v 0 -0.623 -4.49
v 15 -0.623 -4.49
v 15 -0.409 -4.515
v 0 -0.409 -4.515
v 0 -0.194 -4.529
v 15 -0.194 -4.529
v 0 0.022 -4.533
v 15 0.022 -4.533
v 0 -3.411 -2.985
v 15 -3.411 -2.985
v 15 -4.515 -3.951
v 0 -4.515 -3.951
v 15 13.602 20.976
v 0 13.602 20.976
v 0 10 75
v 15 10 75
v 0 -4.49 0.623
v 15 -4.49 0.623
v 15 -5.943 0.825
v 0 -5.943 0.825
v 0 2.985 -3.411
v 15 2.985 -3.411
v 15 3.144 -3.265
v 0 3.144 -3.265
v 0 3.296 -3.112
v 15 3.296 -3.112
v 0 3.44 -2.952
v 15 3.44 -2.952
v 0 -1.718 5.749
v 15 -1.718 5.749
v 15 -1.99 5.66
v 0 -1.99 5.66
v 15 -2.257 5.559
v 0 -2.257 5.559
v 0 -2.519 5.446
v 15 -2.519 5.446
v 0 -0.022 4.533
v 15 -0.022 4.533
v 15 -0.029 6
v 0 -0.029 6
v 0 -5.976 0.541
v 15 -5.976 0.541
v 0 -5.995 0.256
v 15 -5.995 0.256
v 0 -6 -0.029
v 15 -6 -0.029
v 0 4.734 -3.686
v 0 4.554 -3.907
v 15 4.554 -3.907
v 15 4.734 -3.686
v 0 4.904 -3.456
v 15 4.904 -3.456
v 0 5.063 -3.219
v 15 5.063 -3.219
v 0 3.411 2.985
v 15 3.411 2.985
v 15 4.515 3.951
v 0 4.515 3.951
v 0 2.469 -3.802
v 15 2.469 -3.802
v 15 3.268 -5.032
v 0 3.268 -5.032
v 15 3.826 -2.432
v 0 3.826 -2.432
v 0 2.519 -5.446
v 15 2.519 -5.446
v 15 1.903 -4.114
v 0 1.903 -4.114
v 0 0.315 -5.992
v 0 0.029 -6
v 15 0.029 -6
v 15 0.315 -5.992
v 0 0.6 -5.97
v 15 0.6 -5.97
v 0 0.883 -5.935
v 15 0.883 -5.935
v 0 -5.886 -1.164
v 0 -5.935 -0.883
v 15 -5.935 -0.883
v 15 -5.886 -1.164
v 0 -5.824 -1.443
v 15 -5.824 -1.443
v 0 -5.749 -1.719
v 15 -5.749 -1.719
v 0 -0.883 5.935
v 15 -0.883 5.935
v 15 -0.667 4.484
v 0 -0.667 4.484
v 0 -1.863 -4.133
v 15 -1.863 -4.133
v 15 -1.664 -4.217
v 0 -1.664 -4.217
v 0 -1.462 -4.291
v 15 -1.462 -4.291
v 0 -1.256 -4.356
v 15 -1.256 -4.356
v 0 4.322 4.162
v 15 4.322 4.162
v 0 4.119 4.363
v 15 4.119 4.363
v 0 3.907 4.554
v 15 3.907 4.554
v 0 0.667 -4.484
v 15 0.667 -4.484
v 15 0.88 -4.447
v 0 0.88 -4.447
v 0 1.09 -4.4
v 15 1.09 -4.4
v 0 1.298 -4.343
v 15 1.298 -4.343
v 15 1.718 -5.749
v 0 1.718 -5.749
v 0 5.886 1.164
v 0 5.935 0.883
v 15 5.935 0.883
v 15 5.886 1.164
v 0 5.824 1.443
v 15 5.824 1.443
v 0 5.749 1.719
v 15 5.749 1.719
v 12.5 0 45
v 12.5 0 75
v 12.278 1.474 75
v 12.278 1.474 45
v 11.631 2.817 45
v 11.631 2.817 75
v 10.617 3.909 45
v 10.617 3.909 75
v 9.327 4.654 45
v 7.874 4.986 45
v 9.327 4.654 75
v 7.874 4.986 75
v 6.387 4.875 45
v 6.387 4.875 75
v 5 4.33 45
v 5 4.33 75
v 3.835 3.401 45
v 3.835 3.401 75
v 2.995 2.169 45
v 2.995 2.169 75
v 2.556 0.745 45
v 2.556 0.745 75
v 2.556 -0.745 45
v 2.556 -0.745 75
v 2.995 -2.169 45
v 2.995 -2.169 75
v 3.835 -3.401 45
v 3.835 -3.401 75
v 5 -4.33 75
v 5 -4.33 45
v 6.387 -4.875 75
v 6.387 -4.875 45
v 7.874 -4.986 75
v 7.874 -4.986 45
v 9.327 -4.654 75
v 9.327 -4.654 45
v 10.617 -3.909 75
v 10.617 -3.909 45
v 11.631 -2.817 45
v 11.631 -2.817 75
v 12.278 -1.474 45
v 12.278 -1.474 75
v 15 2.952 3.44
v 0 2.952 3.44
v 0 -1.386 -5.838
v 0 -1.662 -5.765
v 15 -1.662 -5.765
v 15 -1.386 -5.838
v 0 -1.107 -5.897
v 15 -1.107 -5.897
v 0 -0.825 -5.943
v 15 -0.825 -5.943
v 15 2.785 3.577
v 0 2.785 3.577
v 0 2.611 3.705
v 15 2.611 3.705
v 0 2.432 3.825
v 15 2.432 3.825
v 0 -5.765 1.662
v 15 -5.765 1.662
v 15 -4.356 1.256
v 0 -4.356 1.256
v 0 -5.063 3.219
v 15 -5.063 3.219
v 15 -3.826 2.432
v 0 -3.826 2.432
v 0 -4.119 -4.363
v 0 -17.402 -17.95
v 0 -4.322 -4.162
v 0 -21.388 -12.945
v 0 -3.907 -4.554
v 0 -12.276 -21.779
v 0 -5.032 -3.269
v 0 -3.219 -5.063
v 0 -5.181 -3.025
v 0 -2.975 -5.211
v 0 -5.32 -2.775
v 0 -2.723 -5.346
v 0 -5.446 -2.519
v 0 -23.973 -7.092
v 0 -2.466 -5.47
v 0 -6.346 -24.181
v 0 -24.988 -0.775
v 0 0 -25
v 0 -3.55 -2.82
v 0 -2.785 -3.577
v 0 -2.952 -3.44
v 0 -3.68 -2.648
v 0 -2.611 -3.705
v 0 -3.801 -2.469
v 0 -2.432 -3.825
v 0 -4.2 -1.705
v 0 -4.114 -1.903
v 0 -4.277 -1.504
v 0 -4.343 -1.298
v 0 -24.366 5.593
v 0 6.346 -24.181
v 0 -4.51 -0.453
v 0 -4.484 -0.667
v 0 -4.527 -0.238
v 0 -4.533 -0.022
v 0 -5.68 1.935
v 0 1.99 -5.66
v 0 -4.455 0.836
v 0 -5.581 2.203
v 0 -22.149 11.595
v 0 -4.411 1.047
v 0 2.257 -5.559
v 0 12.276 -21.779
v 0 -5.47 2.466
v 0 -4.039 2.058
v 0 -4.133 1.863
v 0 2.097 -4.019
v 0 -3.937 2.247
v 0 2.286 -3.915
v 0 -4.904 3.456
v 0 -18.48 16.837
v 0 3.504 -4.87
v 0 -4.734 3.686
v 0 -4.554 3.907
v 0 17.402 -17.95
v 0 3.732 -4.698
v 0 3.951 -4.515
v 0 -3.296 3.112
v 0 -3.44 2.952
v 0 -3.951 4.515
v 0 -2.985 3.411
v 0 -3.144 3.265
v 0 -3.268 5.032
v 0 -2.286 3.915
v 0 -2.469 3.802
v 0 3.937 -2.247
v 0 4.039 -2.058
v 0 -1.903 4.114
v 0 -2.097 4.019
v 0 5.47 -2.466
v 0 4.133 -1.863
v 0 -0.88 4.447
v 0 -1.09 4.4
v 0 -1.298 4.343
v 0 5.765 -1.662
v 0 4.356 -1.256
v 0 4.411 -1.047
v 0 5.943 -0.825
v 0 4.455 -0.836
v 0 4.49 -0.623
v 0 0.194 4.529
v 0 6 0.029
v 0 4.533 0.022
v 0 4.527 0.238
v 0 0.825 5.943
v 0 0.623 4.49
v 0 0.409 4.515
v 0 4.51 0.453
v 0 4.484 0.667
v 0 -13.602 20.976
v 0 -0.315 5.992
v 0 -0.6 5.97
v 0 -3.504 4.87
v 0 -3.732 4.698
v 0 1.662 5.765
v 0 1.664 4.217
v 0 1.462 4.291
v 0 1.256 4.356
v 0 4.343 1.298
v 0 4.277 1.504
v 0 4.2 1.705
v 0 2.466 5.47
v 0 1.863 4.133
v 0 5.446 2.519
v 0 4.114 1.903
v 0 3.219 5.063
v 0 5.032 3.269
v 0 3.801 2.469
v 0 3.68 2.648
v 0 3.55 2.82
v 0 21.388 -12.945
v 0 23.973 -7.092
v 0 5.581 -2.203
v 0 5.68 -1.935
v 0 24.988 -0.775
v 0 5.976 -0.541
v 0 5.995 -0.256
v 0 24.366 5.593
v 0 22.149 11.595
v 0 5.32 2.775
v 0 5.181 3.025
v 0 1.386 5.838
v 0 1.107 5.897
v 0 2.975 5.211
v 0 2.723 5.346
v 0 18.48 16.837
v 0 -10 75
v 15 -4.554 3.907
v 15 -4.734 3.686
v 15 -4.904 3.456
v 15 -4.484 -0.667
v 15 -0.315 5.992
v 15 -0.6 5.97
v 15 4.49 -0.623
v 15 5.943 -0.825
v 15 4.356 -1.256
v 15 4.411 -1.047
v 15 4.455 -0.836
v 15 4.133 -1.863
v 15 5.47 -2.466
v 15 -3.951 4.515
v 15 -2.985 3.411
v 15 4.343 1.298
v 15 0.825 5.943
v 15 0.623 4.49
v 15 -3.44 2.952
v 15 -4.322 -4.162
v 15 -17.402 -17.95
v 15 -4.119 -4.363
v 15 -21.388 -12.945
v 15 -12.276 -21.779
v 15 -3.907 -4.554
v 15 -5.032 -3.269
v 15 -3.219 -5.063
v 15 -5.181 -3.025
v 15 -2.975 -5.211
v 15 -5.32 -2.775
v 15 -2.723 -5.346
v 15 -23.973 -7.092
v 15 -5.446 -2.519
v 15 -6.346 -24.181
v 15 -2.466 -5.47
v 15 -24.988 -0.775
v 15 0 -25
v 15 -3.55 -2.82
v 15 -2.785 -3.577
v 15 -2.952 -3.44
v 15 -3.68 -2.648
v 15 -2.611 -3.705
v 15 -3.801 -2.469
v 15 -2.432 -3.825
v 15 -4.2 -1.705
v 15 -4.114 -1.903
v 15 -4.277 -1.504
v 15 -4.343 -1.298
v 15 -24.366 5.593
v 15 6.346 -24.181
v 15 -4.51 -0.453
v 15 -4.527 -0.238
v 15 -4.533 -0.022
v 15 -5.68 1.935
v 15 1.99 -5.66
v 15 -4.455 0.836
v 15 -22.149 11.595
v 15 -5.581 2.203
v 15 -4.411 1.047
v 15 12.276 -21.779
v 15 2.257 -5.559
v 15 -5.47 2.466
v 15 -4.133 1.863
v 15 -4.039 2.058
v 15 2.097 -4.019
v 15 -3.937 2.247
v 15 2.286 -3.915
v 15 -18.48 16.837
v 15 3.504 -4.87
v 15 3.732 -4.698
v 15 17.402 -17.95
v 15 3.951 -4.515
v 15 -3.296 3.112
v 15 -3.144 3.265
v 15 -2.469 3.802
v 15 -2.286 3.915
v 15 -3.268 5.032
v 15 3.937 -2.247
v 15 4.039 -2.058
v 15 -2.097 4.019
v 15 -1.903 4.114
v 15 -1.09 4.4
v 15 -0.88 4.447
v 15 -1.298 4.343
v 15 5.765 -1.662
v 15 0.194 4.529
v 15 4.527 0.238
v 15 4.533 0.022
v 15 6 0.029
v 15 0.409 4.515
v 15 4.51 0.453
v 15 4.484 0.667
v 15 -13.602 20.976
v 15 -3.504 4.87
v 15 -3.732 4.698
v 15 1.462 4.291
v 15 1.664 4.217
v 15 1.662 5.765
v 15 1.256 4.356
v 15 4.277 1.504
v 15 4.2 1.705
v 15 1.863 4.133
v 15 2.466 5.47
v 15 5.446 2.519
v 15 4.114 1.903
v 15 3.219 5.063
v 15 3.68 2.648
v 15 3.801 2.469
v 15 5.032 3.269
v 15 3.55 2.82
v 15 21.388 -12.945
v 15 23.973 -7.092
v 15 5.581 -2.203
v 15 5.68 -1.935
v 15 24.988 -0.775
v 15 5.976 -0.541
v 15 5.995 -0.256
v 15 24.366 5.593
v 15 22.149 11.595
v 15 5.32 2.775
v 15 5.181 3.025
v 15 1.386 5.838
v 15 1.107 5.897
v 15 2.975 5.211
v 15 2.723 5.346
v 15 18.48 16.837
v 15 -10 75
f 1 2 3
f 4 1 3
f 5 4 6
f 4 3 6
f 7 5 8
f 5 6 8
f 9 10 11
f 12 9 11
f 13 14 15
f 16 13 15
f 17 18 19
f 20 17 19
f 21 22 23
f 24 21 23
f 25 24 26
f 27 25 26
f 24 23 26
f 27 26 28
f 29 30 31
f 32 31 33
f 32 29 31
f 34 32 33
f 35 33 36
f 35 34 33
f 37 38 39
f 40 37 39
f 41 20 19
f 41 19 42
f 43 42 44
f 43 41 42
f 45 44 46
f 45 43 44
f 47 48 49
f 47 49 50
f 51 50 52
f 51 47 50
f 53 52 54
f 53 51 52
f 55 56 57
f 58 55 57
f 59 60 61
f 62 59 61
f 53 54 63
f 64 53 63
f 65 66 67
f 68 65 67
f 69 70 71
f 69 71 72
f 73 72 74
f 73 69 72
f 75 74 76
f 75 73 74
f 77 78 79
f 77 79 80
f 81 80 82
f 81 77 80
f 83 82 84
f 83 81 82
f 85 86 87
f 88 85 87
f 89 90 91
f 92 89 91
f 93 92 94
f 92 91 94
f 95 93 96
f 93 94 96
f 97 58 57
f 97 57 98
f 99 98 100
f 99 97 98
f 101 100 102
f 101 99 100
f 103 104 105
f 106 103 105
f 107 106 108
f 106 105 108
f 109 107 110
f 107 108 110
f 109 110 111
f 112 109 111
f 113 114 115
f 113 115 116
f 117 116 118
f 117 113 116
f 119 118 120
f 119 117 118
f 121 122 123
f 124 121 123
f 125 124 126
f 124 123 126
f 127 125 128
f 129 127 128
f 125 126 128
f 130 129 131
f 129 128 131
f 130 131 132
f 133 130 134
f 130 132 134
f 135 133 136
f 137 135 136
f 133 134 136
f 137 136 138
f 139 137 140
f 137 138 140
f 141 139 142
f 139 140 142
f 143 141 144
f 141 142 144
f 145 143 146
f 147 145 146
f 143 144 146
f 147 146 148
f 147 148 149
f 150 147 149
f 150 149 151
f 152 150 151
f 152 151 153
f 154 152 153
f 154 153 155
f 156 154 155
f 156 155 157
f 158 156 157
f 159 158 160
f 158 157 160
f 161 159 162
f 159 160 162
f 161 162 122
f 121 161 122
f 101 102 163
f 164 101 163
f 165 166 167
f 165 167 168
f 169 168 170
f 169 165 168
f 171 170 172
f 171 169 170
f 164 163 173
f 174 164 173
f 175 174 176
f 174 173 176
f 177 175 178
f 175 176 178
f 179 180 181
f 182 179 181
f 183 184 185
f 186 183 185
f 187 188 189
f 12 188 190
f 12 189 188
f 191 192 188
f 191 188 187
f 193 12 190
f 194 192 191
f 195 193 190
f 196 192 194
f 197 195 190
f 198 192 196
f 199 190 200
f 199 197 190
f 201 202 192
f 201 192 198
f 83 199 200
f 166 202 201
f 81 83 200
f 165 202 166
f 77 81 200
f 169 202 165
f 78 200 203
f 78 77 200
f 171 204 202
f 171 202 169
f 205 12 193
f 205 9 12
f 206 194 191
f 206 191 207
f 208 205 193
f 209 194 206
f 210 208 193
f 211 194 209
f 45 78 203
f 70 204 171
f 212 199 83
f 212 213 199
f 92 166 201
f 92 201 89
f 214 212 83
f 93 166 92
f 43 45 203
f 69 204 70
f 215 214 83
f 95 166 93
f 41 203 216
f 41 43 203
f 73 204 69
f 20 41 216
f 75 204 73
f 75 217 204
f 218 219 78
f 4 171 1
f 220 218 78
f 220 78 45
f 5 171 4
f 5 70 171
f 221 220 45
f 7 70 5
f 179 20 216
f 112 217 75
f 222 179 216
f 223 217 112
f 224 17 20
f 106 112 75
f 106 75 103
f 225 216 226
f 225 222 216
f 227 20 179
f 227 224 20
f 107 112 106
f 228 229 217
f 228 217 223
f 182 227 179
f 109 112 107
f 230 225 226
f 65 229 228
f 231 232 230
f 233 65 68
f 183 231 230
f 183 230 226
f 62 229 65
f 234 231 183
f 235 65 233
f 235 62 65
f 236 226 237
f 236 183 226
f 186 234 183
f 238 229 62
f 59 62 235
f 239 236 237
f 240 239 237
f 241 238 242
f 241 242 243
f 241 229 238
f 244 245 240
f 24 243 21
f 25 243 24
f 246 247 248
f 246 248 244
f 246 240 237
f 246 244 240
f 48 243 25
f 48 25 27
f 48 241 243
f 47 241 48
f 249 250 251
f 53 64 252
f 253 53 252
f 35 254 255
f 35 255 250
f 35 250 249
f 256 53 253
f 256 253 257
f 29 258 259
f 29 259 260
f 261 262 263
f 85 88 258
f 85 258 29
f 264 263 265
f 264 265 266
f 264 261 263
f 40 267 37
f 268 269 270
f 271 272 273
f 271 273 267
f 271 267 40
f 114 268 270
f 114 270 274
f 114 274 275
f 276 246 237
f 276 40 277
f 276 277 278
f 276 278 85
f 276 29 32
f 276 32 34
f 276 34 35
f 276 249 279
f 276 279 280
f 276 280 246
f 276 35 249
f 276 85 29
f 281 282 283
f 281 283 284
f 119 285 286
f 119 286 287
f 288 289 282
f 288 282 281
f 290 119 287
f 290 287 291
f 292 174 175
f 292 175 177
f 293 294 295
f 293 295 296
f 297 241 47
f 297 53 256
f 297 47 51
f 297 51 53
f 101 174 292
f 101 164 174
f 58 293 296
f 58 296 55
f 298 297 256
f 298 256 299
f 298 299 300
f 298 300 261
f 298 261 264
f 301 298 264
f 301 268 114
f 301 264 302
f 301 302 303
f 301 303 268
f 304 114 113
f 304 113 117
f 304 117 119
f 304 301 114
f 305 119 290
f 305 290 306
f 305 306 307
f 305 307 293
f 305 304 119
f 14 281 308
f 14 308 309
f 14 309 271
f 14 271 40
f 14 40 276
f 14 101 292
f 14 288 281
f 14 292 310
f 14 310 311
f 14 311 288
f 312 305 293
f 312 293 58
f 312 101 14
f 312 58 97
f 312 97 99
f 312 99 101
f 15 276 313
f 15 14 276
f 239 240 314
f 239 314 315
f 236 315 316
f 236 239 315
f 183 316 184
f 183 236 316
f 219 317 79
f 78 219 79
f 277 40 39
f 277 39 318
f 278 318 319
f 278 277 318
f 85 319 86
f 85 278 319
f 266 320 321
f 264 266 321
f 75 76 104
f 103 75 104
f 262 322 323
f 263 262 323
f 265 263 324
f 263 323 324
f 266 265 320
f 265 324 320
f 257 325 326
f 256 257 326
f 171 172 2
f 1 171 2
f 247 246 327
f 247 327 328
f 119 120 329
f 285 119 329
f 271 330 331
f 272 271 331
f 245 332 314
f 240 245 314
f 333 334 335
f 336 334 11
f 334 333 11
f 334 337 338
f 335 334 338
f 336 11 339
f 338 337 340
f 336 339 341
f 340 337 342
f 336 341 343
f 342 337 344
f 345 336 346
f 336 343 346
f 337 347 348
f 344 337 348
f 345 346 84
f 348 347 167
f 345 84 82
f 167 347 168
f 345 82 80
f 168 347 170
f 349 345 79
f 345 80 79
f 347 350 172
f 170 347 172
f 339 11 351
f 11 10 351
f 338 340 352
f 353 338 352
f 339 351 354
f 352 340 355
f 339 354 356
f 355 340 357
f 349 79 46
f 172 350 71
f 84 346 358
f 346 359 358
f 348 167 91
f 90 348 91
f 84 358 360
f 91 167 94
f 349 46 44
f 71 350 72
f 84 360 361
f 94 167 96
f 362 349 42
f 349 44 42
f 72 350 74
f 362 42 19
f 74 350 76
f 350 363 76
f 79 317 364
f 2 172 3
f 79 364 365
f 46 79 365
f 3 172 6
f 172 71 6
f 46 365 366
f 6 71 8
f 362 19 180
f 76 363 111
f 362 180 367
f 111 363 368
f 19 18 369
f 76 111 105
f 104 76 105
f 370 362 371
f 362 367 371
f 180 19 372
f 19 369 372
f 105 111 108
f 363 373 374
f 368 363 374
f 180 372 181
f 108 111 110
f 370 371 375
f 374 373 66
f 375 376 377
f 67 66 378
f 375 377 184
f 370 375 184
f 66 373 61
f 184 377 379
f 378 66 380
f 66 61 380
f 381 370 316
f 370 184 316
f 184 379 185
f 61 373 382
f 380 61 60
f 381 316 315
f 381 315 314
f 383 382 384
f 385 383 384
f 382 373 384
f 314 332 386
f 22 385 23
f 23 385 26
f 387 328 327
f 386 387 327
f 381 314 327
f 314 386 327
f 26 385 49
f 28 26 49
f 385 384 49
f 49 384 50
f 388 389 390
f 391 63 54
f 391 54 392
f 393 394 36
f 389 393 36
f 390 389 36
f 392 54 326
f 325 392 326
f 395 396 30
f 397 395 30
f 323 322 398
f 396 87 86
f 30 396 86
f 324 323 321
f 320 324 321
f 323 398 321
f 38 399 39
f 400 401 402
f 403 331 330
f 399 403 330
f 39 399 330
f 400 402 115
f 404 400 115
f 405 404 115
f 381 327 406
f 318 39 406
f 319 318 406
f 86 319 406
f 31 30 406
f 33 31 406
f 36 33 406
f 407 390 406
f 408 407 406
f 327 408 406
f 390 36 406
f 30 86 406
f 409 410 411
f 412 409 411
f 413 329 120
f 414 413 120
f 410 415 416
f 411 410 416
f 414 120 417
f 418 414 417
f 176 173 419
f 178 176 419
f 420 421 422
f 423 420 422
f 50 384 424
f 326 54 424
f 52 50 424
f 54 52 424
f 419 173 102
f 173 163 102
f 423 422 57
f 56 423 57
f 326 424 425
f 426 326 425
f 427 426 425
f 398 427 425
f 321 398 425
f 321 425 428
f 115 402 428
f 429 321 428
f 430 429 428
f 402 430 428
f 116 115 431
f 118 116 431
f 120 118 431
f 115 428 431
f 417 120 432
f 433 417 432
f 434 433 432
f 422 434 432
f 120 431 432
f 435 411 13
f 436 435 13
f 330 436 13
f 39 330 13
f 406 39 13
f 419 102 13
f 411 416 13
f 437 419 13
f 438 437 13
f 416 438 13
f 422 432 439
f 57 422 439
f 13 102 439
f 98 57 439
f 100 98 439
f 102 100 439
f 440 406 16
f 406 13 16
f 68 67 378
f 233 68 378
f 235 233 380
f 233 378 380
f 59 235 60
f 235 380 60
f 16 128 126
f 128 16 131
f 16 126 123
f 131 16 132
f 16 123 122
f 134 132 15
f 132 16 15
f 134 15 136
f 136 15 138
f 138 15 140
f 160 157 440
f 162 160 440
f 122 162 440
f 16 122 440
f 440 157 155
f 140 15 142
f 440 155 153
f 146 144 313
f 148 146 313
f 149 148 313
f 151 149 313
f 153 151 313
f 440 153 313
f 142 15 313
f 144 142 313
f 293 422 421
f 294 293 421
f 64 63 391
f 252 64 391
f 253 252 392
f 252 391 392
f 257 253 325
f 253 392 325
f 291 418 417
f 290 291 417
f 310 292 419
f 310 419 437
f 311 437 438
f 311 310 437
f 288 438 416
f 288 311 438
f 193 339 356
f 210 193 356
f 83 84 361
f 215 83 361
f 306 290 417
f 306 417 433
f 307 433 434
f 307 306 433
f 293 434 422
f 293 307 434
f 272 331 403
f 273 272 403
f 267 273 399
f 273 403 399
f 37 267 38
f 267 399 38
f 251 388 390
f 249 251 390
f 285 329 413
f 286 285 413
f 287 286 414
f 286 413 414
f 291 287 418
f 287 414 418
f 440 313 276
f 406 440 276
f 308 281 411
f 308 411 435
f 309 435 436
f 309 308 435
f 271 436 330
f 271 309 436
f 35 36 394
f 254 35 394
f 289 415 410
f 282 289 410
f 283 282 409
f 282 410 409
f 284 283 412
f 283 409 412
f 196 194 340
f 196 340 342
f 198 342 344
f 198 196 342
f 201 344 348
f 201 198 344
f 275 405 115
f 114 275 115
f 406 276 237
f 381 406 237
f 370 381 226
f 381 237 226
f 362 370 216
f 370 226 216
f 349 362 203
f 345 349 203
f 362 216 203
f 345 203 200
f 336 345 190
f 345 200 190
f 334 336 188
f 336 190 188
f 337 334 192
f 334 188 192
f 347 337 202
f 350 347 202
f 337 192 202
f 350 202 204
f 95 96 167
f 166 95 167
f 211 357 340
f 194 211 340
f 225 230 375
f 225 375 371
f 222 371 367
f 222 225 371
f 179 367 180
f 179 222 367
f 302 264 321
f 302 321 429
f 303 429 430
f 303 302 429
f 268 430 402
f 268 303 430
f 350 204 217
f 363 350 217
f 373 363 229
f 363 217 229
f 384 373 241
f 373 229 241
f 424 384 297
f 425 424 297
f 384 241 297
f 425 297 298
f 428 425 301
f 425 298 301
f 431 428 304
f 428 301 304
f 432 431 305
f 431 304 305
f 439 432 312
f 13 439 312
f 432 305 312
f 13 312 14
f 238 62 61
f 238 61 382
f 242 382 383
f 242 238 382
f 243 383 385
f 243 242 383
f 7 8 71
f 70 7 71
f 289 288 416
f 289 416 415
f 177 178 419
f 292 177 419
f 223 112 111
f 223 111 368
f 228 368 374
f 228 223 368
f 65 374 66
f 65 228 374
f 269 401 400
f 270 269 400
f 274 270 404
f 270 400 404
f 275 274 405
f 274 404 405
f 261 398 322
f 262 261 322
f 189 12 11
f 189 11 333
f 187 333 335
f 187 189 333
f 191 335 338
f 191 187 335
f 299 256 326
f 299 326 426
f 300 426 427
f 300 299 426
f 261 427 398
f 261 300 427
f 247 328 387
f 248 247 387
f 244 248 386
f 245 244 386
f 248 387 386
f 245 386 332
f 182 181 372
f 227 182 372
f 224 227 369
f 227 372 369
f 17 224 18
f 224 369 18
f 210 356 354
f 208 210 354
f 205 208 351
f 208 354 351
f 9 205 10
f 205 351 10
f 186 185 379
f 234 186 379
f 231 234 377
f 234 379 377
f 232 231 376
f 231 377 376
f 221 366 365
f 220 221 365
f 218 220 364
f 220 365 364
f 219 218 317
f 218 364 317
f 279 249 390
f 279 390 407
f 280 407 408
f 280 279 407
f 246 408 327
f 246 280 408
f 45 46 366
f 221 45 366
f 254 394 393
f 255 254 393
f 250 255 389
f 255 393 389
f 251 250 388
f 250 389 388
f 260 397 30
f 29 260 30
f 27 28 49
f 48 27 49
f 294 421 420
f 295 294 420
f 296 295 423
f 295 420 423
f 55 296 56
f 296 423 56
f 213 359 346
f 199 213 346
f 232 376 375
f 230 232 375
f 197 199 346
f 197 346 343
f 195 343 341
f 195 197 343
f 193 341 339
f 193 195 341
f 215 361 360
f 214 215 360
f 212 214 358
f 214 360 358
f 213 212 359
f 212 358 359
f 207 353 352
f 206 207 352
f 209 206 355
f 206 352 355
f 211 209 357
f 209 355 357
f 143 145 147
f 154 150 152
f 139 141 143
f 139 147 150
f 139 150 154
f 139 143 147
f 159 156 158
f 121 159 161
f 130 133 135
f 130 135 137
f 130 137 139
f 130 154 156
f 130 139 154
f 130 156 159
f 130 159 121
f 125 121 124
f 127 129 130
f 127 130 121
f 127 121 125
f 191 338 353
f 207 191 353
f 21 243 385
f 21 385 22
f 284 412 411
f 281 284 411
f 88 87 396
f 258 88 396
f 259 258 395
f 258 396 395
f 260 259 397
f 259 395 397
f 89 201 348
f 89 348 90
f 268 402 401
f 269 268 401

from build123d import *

# Parameters (mm, degrees)
SKETCH1_R           = 6
BOSS_EXTRUDE1_DEPTH = 15
SKETCH2_R           = 5
CUT_EXTRUDE1_DEPTH  = 30
BOSS_EXTRUDE2_DEPTH = 15


with BuildPart() as part:
    # Sketch1 → Boss-Extrude1 (new body)
    with BuildSketch(Plane(origin=(0, 0, 0), x_dir=(0, 0, -1), z_dir=(1, 0, 0))):
        with BuildLine():
            ThreePointArc((25, 0), (7.092163634, 23.972926709), (-20.976097199, 13.60159352))
            ThreePointArc((-20.976097199, 13.60159352), (-25, 0), (-20.976097199, -13.60159352))
            ThreePointArc((-20.976097199, -13.60159352), (7.092163634, -23.972926709), (25, 0))
        make_face()
        Circle(SKETCH1_R, mode=Mode.SUBTRACT)
        with BuildLine():
            ThreePointArc((-20.976097199, -13.60159352), (-25, 0), (-20.976097199, 13.60159352))
            Line((-20.976097199, 13.60159352), (-75, 10))
            Line((-75, 10), (-75, -10))
            Line((-75, -10), (-20.976097199, -13.60159352))
        make_face()
    extrude(amount=BOSS_EXTRUDE1_DEPTH)

    # Sketch2 → Cut-Extrude1 (cut)
    with BuildSketch(Plane.XY.offset(75)):
        with Locations((7.5, 0)):
            Circle(SKETCH2_R)
    extrude(amount=-CUT_EXTRUDE1_DEPTH, mode=Mode.SUBTRACT)

    # Sketch4 → Boss-Extrude2 (add)
    with BuildSketch(Plane(origin=(15, 0, 0), x_dir=(0, 0, -1), z_dir=(1, 0, 0))):
        with BuildLine():
            Line((0.623259764, 4.490102446), (0.824935512, 5.943019552))
            ThreePointArc((0.824935512, 5.943019552), (1.24671071, 5.869046976), (1.662135778, 5.765180366))
            Line((1.662135778, 5.765180366), (1.25578586, 4.355740418))
            ThreePointArc((1.25578586, 4.355740418), (0.941921654, 4.434214283), (0.623259764, 4.490102446))
        make_face()
        with BuildLine():
            Line((1.863021407, 4.132629181), (2.465861922, 5.469874312))
            ThreePointArc((2.465861922, 5.469874312), (2.849711777, 5.280070339), (3.219046605, 5.063372291))
            Line((3.219046605, 5.063372291), (2.432071594, 3.825506564))
            ThreePointArc((2.432071594, 3.825506564), (2.153029737, 3.989227452), (1.863021407, 4.132629181))
        make_face()
        with BuildLine():
            Line((2.951852135, 3.440354878), (3.907018863, 4.553592384))
            ThreePointArc((3.907018863, 4.553592384), (4.221846144, 4.263333806), (4.515169421, 3.951359905))
            Line((4.515169421, 3.951359905), (3.411325351, 2.98535292))
            ThreePointArc((3.411325351, 2.98535292), (3.189712154, 3.221057138), (2.951852135, 3.440354878))
        make_face()
        with BuildLine():
            Line((3.801541359, 2.469363482), (5.031652372, 3.268405484))
            ThreePointArc((5.031652372, 3.268405484), (5.251951644, 2.901207322), (5.445500063, 2.51923184))
            Line((5.445500063, 2.51923184), (4.114213817, 1.903343737))
            ThreePointArc((4.114213817, 1.903343737), (3.967983063, 2.191935931), (3.801541359, 2.469363482))
        make_face()
        with BuildLine():
            Line((4.34325231, 1.298318944), (5.74865133, 1.718431809))
            ThreePointArc((5.74865133, 1.718431809), (5.856575257, 1.304042275), (5.934668676, 0.883010593))
            Line((5.934668676, 0.883010593), (4.483793147, 0.667136964))
            ThreePointArc((4.483793147, 0.667136964), (4.424791583, 0.98523711), (4.34325231, 1.298318944))
        make_face()
        with BuildLine():
            Line((4.53309879, 0.022092326), (5.999928747, 0.029241008))
            ThreePointArc((5.999928747, 0.029241008), (5.986733973, -0.398768521), (5.943045727, -0.82474692))
            Line((5.943045727, -0.82474692), (4.490122222, -0.623117278))
            ThreePointArc((4.490122222, -0.623117278), (4.523129803, -0.301279761), (4.53309879, 0.022092326))
        make_face()
        with BuildLine():
            Line((4.355700565, -1.255924081), (5.765127618, -1.662318725))
            ThreePointArc((5.765127618, -1.662318725), (5.631883107, -2.069273464), (5.469952559, -2.465688343))
            Line((5.469952559, -2.465688343), (4.132688299, -1.862890264))
            ThreePointArc((4.132688299, -1.862890264), (4.255030947, -1.563388739), (4.355700565, -1.255924081))
        make_face()
        with BuildLine():
            Line((3.825429385, -2.432192989), (5.063270137, -3.219207281))
            ThreePointArc((5.063270137, -3.219207281), (4.820770566, -3.572138177), (4.553716365, -3.906874361))
            Line((4.553716365, -3.906874361), (3.440448548, -2.95174296))
            ThreePointArc((3.440448548, -2.95174296), (3.64221479, -2.698841258), (3.825429385, -2.432192989))
        make_face()
        with BuildLine():
            Line((2.985244666, -3.411420085), (3.951216622, -4.515294808))
            ThreePointArc((3.951216622, -4.515294808), (3.619107863, -4.785609499), (3.268565153, -5.031548652))
            Line((3.268565153, -5.031548652), (2.469484116, -3.801462996))
            ThreePointArc((2.469484116, -3.801462996), (2.734328051, -3.615649709), (2.985244666, -3.411420085))
        make_face()
        with BuildLine():
            Line((1.903213179, -4.114274214), (2.519059035, -5.445580004))
            ThreePointArc((2.519059035, -5.445580004), (2.124246566, -5.6113792), (1.718614231, -5.748596796))
            Line((1.718614231, -5.748596796), (1.298456769, -4.343211108))
            ThreePointArc((1.298456769, -4.343211108), (1.604922315, -4.239539724), (1.903213179, -4.114274214))
        make_face()
        with BuildLine():
            Line((0.666994679, -4.483814315), (0.882822266, -5.934696694))
            ThreePointArc((0.882822266, -5.934696694), (0.457291444, -5.982548331), (0.029431406, -5.999927816))
            Line((0.029431406, -5.999927816), (0.022236176, -4.533098087))
            ThreePointArc((0.022236176, -4.533098087), (0.345495319, -4.519967444), (0.666994679, -4.483814315))
        make_face()
        with BuildLine():
            Line((-0.623259764, -4.490102446), (-0.824935512, -5.943019552))
            ThreePointArc((-0.824935512, -5.943019552), (-1.24671071, -5.869046976), (-1.662135778, -5.765180366))
            Line((-1.662135778, -5.765180366), (-1.25578586, -4.355740418))
            ThreePointArc((-1.25578586, -4.355740418), (-0.941921654, -4.434214283), (-0.623259764, -4.490102446))
        make_face()
        with BuildLine():
            Line((-1.863021407, -4.132629181), (-2.465861922, -5.469874312))
            ThreePointArc((-2.465861922, -5.469874312), (-2.849711777, -5.280070339), (-3.219046605, -5.063372291))
            Line((-3.219046605, -5.063372291), (-2.432071594, -3.825506564))
            ThreePointArc((-2.432071594, -3.825506564), (-2.153029737, -3.989227452), (-1.863021407, -4.132629181))
        make_face()
        with BuildLine():
            Line((-2.951852135, -3.440354878), (-3.907018863, -4.553592384))
            ThreePointArc((-3.907018863, -4.553592384), (-4.221846144, -4.263333806), (-4.515169421, -3.951359905))
            Line((-4.515169421, -3.951359905), (-3.411325351, -2.98535292))
            ThreePointArc((-3.411325351, -2.98535292), (-3.189712154, -3.221057138), (-2.951852135, -3.440354878))
        make_face()
        with BuildLine():
            Line((-3.801541359, -2.469363482), (-5.031652372, -3.268405484))
            ThreePointArc((-5.031652372, -3.268405484), (-5.251951644, -2.901207322), (-5.445500063, -2.51923184))
            Line((-5.445500063, -2.51923184), (-4.114213817, -1.903343737))
            ThreePointArc((-4.114213817, -1.903343737), (-3.967983063, -2.191935931), (-3.801541359, -2.469363482))
        make_face()
        with BuildLine():
            Line((-4.34325231, -1.298318944), (-5.74865133, -1.718431809))
            ThreePointArc((-5.74865133, -1.718431809), (-5.856575257, -1.304042275), (-5.934668676, -0.883010593))
            Line((-5.934668676, -0.883010593), (-4.483793147, -0.667136964))
            ThreePointArc((-4.483793147, -0.667136964), (-4.424791583, -0.98523711), (-4.34325231, -1.298318944))
        make_face()
        with BuildLine():
            Line((-4.53309879, -0.022092326), (-5.999928747, -0.029241008))
            ThreePointArc((-5.999928747, -0.029241008), (-5.986733973, 0.398768521), (-5.943045727, 0.82474692))
            Line((-5.943045727, 0.82474692), (-4.490122222, 0.623117278))
            ThreePointArc((-4.490122222, 0.623117278), (-4.523129803, 0.301279761), (-4.53309879, -0.022092326))
        make_face()
        with BuildLine():
            Line((-4.355700565, 1.255924081), (-5.765127618, 1.662318725))
            ThreePointArc((-5.765127618, 1.662318725), (-5.631883107, 2.069273464), (-5.469952559, 2.465688343))
            Line((-5.469952559, 2.465688343), (-4.132688299, 1.862890264))
            ThreePointArc((-4.132688299, 1.862890264), (-4.255030947, 1.563388739), (-4.355700565, 1.255924081))
        make_face()
        with BuildLine():
            Line((-3.825429385, 2.432192989), (-5.063270137, 3.219207281))
            ThreePointArc((-5.063270137, 3.219207281), (-4.820770566, 3.572138177), (-4.553716365, 3.906874361))
            Line((-4.553716365, 3.906874361), (-3.440448548, 2.95174296))
            ThreePointArc((-3.440448548, 2.95174296), (-3.64221479, 2.698841258), (-3.825429385, 2.432192989))
        make_face()
        with BuildLine():
            Line((-2.985244666, 3.411420085), (-3.951216622, 4.515294808))
            ThreePointArc((-3.951216622, 4.515294808), (-3.619107863, 4.785609499), (-3.268565153, 5.031548652))
            Line((-3.268565153, 5.031548652), (-2.469484116, 3.801462996))
            ThreePointArc((-2.469484116, 3.801462996), (-2.734328051, 3.615649709), (-2.985244666, 3.411420085))
        make_face()
        with BuildLine():
            Line((-1.903213179, 4.114274214), (-2.519059035, 5.445580004))
            ThreePointArc((-2.519059035, 5.445580004), (-2.124246566, 5.6113792), (-1.718614231, 5.748596796))
            Line((-1.718614231, 5.748596796), (-1.298456769, 4.343211108))
            ThreePointArc((-1.298456769, 4.343211108), (-1.604922315, 4.239539724), (-1.903213179, 4.114274214))
        make_face()
        with BuildLine():
            Line((-0.666994679, 4.483814315), (-0.882822266, 5.934696694))
            ThreePointArc((-0.882822266, 5.934696694), (-0.457291444, 5.982548331), (-0.029431406, 5.999927816))
            Line((-0.029431406, 5.999927816), (-0.022236176, 4.533098087))
            ThreePointArc((-0.022236176, 4.533098087), (-0.345495319, 4.519967444), (-0.666994679, 4.483814315))
        make_face()
    extrude(amount=-BOSS_EXTRUDE2_DEPTH)


solid = part.part
